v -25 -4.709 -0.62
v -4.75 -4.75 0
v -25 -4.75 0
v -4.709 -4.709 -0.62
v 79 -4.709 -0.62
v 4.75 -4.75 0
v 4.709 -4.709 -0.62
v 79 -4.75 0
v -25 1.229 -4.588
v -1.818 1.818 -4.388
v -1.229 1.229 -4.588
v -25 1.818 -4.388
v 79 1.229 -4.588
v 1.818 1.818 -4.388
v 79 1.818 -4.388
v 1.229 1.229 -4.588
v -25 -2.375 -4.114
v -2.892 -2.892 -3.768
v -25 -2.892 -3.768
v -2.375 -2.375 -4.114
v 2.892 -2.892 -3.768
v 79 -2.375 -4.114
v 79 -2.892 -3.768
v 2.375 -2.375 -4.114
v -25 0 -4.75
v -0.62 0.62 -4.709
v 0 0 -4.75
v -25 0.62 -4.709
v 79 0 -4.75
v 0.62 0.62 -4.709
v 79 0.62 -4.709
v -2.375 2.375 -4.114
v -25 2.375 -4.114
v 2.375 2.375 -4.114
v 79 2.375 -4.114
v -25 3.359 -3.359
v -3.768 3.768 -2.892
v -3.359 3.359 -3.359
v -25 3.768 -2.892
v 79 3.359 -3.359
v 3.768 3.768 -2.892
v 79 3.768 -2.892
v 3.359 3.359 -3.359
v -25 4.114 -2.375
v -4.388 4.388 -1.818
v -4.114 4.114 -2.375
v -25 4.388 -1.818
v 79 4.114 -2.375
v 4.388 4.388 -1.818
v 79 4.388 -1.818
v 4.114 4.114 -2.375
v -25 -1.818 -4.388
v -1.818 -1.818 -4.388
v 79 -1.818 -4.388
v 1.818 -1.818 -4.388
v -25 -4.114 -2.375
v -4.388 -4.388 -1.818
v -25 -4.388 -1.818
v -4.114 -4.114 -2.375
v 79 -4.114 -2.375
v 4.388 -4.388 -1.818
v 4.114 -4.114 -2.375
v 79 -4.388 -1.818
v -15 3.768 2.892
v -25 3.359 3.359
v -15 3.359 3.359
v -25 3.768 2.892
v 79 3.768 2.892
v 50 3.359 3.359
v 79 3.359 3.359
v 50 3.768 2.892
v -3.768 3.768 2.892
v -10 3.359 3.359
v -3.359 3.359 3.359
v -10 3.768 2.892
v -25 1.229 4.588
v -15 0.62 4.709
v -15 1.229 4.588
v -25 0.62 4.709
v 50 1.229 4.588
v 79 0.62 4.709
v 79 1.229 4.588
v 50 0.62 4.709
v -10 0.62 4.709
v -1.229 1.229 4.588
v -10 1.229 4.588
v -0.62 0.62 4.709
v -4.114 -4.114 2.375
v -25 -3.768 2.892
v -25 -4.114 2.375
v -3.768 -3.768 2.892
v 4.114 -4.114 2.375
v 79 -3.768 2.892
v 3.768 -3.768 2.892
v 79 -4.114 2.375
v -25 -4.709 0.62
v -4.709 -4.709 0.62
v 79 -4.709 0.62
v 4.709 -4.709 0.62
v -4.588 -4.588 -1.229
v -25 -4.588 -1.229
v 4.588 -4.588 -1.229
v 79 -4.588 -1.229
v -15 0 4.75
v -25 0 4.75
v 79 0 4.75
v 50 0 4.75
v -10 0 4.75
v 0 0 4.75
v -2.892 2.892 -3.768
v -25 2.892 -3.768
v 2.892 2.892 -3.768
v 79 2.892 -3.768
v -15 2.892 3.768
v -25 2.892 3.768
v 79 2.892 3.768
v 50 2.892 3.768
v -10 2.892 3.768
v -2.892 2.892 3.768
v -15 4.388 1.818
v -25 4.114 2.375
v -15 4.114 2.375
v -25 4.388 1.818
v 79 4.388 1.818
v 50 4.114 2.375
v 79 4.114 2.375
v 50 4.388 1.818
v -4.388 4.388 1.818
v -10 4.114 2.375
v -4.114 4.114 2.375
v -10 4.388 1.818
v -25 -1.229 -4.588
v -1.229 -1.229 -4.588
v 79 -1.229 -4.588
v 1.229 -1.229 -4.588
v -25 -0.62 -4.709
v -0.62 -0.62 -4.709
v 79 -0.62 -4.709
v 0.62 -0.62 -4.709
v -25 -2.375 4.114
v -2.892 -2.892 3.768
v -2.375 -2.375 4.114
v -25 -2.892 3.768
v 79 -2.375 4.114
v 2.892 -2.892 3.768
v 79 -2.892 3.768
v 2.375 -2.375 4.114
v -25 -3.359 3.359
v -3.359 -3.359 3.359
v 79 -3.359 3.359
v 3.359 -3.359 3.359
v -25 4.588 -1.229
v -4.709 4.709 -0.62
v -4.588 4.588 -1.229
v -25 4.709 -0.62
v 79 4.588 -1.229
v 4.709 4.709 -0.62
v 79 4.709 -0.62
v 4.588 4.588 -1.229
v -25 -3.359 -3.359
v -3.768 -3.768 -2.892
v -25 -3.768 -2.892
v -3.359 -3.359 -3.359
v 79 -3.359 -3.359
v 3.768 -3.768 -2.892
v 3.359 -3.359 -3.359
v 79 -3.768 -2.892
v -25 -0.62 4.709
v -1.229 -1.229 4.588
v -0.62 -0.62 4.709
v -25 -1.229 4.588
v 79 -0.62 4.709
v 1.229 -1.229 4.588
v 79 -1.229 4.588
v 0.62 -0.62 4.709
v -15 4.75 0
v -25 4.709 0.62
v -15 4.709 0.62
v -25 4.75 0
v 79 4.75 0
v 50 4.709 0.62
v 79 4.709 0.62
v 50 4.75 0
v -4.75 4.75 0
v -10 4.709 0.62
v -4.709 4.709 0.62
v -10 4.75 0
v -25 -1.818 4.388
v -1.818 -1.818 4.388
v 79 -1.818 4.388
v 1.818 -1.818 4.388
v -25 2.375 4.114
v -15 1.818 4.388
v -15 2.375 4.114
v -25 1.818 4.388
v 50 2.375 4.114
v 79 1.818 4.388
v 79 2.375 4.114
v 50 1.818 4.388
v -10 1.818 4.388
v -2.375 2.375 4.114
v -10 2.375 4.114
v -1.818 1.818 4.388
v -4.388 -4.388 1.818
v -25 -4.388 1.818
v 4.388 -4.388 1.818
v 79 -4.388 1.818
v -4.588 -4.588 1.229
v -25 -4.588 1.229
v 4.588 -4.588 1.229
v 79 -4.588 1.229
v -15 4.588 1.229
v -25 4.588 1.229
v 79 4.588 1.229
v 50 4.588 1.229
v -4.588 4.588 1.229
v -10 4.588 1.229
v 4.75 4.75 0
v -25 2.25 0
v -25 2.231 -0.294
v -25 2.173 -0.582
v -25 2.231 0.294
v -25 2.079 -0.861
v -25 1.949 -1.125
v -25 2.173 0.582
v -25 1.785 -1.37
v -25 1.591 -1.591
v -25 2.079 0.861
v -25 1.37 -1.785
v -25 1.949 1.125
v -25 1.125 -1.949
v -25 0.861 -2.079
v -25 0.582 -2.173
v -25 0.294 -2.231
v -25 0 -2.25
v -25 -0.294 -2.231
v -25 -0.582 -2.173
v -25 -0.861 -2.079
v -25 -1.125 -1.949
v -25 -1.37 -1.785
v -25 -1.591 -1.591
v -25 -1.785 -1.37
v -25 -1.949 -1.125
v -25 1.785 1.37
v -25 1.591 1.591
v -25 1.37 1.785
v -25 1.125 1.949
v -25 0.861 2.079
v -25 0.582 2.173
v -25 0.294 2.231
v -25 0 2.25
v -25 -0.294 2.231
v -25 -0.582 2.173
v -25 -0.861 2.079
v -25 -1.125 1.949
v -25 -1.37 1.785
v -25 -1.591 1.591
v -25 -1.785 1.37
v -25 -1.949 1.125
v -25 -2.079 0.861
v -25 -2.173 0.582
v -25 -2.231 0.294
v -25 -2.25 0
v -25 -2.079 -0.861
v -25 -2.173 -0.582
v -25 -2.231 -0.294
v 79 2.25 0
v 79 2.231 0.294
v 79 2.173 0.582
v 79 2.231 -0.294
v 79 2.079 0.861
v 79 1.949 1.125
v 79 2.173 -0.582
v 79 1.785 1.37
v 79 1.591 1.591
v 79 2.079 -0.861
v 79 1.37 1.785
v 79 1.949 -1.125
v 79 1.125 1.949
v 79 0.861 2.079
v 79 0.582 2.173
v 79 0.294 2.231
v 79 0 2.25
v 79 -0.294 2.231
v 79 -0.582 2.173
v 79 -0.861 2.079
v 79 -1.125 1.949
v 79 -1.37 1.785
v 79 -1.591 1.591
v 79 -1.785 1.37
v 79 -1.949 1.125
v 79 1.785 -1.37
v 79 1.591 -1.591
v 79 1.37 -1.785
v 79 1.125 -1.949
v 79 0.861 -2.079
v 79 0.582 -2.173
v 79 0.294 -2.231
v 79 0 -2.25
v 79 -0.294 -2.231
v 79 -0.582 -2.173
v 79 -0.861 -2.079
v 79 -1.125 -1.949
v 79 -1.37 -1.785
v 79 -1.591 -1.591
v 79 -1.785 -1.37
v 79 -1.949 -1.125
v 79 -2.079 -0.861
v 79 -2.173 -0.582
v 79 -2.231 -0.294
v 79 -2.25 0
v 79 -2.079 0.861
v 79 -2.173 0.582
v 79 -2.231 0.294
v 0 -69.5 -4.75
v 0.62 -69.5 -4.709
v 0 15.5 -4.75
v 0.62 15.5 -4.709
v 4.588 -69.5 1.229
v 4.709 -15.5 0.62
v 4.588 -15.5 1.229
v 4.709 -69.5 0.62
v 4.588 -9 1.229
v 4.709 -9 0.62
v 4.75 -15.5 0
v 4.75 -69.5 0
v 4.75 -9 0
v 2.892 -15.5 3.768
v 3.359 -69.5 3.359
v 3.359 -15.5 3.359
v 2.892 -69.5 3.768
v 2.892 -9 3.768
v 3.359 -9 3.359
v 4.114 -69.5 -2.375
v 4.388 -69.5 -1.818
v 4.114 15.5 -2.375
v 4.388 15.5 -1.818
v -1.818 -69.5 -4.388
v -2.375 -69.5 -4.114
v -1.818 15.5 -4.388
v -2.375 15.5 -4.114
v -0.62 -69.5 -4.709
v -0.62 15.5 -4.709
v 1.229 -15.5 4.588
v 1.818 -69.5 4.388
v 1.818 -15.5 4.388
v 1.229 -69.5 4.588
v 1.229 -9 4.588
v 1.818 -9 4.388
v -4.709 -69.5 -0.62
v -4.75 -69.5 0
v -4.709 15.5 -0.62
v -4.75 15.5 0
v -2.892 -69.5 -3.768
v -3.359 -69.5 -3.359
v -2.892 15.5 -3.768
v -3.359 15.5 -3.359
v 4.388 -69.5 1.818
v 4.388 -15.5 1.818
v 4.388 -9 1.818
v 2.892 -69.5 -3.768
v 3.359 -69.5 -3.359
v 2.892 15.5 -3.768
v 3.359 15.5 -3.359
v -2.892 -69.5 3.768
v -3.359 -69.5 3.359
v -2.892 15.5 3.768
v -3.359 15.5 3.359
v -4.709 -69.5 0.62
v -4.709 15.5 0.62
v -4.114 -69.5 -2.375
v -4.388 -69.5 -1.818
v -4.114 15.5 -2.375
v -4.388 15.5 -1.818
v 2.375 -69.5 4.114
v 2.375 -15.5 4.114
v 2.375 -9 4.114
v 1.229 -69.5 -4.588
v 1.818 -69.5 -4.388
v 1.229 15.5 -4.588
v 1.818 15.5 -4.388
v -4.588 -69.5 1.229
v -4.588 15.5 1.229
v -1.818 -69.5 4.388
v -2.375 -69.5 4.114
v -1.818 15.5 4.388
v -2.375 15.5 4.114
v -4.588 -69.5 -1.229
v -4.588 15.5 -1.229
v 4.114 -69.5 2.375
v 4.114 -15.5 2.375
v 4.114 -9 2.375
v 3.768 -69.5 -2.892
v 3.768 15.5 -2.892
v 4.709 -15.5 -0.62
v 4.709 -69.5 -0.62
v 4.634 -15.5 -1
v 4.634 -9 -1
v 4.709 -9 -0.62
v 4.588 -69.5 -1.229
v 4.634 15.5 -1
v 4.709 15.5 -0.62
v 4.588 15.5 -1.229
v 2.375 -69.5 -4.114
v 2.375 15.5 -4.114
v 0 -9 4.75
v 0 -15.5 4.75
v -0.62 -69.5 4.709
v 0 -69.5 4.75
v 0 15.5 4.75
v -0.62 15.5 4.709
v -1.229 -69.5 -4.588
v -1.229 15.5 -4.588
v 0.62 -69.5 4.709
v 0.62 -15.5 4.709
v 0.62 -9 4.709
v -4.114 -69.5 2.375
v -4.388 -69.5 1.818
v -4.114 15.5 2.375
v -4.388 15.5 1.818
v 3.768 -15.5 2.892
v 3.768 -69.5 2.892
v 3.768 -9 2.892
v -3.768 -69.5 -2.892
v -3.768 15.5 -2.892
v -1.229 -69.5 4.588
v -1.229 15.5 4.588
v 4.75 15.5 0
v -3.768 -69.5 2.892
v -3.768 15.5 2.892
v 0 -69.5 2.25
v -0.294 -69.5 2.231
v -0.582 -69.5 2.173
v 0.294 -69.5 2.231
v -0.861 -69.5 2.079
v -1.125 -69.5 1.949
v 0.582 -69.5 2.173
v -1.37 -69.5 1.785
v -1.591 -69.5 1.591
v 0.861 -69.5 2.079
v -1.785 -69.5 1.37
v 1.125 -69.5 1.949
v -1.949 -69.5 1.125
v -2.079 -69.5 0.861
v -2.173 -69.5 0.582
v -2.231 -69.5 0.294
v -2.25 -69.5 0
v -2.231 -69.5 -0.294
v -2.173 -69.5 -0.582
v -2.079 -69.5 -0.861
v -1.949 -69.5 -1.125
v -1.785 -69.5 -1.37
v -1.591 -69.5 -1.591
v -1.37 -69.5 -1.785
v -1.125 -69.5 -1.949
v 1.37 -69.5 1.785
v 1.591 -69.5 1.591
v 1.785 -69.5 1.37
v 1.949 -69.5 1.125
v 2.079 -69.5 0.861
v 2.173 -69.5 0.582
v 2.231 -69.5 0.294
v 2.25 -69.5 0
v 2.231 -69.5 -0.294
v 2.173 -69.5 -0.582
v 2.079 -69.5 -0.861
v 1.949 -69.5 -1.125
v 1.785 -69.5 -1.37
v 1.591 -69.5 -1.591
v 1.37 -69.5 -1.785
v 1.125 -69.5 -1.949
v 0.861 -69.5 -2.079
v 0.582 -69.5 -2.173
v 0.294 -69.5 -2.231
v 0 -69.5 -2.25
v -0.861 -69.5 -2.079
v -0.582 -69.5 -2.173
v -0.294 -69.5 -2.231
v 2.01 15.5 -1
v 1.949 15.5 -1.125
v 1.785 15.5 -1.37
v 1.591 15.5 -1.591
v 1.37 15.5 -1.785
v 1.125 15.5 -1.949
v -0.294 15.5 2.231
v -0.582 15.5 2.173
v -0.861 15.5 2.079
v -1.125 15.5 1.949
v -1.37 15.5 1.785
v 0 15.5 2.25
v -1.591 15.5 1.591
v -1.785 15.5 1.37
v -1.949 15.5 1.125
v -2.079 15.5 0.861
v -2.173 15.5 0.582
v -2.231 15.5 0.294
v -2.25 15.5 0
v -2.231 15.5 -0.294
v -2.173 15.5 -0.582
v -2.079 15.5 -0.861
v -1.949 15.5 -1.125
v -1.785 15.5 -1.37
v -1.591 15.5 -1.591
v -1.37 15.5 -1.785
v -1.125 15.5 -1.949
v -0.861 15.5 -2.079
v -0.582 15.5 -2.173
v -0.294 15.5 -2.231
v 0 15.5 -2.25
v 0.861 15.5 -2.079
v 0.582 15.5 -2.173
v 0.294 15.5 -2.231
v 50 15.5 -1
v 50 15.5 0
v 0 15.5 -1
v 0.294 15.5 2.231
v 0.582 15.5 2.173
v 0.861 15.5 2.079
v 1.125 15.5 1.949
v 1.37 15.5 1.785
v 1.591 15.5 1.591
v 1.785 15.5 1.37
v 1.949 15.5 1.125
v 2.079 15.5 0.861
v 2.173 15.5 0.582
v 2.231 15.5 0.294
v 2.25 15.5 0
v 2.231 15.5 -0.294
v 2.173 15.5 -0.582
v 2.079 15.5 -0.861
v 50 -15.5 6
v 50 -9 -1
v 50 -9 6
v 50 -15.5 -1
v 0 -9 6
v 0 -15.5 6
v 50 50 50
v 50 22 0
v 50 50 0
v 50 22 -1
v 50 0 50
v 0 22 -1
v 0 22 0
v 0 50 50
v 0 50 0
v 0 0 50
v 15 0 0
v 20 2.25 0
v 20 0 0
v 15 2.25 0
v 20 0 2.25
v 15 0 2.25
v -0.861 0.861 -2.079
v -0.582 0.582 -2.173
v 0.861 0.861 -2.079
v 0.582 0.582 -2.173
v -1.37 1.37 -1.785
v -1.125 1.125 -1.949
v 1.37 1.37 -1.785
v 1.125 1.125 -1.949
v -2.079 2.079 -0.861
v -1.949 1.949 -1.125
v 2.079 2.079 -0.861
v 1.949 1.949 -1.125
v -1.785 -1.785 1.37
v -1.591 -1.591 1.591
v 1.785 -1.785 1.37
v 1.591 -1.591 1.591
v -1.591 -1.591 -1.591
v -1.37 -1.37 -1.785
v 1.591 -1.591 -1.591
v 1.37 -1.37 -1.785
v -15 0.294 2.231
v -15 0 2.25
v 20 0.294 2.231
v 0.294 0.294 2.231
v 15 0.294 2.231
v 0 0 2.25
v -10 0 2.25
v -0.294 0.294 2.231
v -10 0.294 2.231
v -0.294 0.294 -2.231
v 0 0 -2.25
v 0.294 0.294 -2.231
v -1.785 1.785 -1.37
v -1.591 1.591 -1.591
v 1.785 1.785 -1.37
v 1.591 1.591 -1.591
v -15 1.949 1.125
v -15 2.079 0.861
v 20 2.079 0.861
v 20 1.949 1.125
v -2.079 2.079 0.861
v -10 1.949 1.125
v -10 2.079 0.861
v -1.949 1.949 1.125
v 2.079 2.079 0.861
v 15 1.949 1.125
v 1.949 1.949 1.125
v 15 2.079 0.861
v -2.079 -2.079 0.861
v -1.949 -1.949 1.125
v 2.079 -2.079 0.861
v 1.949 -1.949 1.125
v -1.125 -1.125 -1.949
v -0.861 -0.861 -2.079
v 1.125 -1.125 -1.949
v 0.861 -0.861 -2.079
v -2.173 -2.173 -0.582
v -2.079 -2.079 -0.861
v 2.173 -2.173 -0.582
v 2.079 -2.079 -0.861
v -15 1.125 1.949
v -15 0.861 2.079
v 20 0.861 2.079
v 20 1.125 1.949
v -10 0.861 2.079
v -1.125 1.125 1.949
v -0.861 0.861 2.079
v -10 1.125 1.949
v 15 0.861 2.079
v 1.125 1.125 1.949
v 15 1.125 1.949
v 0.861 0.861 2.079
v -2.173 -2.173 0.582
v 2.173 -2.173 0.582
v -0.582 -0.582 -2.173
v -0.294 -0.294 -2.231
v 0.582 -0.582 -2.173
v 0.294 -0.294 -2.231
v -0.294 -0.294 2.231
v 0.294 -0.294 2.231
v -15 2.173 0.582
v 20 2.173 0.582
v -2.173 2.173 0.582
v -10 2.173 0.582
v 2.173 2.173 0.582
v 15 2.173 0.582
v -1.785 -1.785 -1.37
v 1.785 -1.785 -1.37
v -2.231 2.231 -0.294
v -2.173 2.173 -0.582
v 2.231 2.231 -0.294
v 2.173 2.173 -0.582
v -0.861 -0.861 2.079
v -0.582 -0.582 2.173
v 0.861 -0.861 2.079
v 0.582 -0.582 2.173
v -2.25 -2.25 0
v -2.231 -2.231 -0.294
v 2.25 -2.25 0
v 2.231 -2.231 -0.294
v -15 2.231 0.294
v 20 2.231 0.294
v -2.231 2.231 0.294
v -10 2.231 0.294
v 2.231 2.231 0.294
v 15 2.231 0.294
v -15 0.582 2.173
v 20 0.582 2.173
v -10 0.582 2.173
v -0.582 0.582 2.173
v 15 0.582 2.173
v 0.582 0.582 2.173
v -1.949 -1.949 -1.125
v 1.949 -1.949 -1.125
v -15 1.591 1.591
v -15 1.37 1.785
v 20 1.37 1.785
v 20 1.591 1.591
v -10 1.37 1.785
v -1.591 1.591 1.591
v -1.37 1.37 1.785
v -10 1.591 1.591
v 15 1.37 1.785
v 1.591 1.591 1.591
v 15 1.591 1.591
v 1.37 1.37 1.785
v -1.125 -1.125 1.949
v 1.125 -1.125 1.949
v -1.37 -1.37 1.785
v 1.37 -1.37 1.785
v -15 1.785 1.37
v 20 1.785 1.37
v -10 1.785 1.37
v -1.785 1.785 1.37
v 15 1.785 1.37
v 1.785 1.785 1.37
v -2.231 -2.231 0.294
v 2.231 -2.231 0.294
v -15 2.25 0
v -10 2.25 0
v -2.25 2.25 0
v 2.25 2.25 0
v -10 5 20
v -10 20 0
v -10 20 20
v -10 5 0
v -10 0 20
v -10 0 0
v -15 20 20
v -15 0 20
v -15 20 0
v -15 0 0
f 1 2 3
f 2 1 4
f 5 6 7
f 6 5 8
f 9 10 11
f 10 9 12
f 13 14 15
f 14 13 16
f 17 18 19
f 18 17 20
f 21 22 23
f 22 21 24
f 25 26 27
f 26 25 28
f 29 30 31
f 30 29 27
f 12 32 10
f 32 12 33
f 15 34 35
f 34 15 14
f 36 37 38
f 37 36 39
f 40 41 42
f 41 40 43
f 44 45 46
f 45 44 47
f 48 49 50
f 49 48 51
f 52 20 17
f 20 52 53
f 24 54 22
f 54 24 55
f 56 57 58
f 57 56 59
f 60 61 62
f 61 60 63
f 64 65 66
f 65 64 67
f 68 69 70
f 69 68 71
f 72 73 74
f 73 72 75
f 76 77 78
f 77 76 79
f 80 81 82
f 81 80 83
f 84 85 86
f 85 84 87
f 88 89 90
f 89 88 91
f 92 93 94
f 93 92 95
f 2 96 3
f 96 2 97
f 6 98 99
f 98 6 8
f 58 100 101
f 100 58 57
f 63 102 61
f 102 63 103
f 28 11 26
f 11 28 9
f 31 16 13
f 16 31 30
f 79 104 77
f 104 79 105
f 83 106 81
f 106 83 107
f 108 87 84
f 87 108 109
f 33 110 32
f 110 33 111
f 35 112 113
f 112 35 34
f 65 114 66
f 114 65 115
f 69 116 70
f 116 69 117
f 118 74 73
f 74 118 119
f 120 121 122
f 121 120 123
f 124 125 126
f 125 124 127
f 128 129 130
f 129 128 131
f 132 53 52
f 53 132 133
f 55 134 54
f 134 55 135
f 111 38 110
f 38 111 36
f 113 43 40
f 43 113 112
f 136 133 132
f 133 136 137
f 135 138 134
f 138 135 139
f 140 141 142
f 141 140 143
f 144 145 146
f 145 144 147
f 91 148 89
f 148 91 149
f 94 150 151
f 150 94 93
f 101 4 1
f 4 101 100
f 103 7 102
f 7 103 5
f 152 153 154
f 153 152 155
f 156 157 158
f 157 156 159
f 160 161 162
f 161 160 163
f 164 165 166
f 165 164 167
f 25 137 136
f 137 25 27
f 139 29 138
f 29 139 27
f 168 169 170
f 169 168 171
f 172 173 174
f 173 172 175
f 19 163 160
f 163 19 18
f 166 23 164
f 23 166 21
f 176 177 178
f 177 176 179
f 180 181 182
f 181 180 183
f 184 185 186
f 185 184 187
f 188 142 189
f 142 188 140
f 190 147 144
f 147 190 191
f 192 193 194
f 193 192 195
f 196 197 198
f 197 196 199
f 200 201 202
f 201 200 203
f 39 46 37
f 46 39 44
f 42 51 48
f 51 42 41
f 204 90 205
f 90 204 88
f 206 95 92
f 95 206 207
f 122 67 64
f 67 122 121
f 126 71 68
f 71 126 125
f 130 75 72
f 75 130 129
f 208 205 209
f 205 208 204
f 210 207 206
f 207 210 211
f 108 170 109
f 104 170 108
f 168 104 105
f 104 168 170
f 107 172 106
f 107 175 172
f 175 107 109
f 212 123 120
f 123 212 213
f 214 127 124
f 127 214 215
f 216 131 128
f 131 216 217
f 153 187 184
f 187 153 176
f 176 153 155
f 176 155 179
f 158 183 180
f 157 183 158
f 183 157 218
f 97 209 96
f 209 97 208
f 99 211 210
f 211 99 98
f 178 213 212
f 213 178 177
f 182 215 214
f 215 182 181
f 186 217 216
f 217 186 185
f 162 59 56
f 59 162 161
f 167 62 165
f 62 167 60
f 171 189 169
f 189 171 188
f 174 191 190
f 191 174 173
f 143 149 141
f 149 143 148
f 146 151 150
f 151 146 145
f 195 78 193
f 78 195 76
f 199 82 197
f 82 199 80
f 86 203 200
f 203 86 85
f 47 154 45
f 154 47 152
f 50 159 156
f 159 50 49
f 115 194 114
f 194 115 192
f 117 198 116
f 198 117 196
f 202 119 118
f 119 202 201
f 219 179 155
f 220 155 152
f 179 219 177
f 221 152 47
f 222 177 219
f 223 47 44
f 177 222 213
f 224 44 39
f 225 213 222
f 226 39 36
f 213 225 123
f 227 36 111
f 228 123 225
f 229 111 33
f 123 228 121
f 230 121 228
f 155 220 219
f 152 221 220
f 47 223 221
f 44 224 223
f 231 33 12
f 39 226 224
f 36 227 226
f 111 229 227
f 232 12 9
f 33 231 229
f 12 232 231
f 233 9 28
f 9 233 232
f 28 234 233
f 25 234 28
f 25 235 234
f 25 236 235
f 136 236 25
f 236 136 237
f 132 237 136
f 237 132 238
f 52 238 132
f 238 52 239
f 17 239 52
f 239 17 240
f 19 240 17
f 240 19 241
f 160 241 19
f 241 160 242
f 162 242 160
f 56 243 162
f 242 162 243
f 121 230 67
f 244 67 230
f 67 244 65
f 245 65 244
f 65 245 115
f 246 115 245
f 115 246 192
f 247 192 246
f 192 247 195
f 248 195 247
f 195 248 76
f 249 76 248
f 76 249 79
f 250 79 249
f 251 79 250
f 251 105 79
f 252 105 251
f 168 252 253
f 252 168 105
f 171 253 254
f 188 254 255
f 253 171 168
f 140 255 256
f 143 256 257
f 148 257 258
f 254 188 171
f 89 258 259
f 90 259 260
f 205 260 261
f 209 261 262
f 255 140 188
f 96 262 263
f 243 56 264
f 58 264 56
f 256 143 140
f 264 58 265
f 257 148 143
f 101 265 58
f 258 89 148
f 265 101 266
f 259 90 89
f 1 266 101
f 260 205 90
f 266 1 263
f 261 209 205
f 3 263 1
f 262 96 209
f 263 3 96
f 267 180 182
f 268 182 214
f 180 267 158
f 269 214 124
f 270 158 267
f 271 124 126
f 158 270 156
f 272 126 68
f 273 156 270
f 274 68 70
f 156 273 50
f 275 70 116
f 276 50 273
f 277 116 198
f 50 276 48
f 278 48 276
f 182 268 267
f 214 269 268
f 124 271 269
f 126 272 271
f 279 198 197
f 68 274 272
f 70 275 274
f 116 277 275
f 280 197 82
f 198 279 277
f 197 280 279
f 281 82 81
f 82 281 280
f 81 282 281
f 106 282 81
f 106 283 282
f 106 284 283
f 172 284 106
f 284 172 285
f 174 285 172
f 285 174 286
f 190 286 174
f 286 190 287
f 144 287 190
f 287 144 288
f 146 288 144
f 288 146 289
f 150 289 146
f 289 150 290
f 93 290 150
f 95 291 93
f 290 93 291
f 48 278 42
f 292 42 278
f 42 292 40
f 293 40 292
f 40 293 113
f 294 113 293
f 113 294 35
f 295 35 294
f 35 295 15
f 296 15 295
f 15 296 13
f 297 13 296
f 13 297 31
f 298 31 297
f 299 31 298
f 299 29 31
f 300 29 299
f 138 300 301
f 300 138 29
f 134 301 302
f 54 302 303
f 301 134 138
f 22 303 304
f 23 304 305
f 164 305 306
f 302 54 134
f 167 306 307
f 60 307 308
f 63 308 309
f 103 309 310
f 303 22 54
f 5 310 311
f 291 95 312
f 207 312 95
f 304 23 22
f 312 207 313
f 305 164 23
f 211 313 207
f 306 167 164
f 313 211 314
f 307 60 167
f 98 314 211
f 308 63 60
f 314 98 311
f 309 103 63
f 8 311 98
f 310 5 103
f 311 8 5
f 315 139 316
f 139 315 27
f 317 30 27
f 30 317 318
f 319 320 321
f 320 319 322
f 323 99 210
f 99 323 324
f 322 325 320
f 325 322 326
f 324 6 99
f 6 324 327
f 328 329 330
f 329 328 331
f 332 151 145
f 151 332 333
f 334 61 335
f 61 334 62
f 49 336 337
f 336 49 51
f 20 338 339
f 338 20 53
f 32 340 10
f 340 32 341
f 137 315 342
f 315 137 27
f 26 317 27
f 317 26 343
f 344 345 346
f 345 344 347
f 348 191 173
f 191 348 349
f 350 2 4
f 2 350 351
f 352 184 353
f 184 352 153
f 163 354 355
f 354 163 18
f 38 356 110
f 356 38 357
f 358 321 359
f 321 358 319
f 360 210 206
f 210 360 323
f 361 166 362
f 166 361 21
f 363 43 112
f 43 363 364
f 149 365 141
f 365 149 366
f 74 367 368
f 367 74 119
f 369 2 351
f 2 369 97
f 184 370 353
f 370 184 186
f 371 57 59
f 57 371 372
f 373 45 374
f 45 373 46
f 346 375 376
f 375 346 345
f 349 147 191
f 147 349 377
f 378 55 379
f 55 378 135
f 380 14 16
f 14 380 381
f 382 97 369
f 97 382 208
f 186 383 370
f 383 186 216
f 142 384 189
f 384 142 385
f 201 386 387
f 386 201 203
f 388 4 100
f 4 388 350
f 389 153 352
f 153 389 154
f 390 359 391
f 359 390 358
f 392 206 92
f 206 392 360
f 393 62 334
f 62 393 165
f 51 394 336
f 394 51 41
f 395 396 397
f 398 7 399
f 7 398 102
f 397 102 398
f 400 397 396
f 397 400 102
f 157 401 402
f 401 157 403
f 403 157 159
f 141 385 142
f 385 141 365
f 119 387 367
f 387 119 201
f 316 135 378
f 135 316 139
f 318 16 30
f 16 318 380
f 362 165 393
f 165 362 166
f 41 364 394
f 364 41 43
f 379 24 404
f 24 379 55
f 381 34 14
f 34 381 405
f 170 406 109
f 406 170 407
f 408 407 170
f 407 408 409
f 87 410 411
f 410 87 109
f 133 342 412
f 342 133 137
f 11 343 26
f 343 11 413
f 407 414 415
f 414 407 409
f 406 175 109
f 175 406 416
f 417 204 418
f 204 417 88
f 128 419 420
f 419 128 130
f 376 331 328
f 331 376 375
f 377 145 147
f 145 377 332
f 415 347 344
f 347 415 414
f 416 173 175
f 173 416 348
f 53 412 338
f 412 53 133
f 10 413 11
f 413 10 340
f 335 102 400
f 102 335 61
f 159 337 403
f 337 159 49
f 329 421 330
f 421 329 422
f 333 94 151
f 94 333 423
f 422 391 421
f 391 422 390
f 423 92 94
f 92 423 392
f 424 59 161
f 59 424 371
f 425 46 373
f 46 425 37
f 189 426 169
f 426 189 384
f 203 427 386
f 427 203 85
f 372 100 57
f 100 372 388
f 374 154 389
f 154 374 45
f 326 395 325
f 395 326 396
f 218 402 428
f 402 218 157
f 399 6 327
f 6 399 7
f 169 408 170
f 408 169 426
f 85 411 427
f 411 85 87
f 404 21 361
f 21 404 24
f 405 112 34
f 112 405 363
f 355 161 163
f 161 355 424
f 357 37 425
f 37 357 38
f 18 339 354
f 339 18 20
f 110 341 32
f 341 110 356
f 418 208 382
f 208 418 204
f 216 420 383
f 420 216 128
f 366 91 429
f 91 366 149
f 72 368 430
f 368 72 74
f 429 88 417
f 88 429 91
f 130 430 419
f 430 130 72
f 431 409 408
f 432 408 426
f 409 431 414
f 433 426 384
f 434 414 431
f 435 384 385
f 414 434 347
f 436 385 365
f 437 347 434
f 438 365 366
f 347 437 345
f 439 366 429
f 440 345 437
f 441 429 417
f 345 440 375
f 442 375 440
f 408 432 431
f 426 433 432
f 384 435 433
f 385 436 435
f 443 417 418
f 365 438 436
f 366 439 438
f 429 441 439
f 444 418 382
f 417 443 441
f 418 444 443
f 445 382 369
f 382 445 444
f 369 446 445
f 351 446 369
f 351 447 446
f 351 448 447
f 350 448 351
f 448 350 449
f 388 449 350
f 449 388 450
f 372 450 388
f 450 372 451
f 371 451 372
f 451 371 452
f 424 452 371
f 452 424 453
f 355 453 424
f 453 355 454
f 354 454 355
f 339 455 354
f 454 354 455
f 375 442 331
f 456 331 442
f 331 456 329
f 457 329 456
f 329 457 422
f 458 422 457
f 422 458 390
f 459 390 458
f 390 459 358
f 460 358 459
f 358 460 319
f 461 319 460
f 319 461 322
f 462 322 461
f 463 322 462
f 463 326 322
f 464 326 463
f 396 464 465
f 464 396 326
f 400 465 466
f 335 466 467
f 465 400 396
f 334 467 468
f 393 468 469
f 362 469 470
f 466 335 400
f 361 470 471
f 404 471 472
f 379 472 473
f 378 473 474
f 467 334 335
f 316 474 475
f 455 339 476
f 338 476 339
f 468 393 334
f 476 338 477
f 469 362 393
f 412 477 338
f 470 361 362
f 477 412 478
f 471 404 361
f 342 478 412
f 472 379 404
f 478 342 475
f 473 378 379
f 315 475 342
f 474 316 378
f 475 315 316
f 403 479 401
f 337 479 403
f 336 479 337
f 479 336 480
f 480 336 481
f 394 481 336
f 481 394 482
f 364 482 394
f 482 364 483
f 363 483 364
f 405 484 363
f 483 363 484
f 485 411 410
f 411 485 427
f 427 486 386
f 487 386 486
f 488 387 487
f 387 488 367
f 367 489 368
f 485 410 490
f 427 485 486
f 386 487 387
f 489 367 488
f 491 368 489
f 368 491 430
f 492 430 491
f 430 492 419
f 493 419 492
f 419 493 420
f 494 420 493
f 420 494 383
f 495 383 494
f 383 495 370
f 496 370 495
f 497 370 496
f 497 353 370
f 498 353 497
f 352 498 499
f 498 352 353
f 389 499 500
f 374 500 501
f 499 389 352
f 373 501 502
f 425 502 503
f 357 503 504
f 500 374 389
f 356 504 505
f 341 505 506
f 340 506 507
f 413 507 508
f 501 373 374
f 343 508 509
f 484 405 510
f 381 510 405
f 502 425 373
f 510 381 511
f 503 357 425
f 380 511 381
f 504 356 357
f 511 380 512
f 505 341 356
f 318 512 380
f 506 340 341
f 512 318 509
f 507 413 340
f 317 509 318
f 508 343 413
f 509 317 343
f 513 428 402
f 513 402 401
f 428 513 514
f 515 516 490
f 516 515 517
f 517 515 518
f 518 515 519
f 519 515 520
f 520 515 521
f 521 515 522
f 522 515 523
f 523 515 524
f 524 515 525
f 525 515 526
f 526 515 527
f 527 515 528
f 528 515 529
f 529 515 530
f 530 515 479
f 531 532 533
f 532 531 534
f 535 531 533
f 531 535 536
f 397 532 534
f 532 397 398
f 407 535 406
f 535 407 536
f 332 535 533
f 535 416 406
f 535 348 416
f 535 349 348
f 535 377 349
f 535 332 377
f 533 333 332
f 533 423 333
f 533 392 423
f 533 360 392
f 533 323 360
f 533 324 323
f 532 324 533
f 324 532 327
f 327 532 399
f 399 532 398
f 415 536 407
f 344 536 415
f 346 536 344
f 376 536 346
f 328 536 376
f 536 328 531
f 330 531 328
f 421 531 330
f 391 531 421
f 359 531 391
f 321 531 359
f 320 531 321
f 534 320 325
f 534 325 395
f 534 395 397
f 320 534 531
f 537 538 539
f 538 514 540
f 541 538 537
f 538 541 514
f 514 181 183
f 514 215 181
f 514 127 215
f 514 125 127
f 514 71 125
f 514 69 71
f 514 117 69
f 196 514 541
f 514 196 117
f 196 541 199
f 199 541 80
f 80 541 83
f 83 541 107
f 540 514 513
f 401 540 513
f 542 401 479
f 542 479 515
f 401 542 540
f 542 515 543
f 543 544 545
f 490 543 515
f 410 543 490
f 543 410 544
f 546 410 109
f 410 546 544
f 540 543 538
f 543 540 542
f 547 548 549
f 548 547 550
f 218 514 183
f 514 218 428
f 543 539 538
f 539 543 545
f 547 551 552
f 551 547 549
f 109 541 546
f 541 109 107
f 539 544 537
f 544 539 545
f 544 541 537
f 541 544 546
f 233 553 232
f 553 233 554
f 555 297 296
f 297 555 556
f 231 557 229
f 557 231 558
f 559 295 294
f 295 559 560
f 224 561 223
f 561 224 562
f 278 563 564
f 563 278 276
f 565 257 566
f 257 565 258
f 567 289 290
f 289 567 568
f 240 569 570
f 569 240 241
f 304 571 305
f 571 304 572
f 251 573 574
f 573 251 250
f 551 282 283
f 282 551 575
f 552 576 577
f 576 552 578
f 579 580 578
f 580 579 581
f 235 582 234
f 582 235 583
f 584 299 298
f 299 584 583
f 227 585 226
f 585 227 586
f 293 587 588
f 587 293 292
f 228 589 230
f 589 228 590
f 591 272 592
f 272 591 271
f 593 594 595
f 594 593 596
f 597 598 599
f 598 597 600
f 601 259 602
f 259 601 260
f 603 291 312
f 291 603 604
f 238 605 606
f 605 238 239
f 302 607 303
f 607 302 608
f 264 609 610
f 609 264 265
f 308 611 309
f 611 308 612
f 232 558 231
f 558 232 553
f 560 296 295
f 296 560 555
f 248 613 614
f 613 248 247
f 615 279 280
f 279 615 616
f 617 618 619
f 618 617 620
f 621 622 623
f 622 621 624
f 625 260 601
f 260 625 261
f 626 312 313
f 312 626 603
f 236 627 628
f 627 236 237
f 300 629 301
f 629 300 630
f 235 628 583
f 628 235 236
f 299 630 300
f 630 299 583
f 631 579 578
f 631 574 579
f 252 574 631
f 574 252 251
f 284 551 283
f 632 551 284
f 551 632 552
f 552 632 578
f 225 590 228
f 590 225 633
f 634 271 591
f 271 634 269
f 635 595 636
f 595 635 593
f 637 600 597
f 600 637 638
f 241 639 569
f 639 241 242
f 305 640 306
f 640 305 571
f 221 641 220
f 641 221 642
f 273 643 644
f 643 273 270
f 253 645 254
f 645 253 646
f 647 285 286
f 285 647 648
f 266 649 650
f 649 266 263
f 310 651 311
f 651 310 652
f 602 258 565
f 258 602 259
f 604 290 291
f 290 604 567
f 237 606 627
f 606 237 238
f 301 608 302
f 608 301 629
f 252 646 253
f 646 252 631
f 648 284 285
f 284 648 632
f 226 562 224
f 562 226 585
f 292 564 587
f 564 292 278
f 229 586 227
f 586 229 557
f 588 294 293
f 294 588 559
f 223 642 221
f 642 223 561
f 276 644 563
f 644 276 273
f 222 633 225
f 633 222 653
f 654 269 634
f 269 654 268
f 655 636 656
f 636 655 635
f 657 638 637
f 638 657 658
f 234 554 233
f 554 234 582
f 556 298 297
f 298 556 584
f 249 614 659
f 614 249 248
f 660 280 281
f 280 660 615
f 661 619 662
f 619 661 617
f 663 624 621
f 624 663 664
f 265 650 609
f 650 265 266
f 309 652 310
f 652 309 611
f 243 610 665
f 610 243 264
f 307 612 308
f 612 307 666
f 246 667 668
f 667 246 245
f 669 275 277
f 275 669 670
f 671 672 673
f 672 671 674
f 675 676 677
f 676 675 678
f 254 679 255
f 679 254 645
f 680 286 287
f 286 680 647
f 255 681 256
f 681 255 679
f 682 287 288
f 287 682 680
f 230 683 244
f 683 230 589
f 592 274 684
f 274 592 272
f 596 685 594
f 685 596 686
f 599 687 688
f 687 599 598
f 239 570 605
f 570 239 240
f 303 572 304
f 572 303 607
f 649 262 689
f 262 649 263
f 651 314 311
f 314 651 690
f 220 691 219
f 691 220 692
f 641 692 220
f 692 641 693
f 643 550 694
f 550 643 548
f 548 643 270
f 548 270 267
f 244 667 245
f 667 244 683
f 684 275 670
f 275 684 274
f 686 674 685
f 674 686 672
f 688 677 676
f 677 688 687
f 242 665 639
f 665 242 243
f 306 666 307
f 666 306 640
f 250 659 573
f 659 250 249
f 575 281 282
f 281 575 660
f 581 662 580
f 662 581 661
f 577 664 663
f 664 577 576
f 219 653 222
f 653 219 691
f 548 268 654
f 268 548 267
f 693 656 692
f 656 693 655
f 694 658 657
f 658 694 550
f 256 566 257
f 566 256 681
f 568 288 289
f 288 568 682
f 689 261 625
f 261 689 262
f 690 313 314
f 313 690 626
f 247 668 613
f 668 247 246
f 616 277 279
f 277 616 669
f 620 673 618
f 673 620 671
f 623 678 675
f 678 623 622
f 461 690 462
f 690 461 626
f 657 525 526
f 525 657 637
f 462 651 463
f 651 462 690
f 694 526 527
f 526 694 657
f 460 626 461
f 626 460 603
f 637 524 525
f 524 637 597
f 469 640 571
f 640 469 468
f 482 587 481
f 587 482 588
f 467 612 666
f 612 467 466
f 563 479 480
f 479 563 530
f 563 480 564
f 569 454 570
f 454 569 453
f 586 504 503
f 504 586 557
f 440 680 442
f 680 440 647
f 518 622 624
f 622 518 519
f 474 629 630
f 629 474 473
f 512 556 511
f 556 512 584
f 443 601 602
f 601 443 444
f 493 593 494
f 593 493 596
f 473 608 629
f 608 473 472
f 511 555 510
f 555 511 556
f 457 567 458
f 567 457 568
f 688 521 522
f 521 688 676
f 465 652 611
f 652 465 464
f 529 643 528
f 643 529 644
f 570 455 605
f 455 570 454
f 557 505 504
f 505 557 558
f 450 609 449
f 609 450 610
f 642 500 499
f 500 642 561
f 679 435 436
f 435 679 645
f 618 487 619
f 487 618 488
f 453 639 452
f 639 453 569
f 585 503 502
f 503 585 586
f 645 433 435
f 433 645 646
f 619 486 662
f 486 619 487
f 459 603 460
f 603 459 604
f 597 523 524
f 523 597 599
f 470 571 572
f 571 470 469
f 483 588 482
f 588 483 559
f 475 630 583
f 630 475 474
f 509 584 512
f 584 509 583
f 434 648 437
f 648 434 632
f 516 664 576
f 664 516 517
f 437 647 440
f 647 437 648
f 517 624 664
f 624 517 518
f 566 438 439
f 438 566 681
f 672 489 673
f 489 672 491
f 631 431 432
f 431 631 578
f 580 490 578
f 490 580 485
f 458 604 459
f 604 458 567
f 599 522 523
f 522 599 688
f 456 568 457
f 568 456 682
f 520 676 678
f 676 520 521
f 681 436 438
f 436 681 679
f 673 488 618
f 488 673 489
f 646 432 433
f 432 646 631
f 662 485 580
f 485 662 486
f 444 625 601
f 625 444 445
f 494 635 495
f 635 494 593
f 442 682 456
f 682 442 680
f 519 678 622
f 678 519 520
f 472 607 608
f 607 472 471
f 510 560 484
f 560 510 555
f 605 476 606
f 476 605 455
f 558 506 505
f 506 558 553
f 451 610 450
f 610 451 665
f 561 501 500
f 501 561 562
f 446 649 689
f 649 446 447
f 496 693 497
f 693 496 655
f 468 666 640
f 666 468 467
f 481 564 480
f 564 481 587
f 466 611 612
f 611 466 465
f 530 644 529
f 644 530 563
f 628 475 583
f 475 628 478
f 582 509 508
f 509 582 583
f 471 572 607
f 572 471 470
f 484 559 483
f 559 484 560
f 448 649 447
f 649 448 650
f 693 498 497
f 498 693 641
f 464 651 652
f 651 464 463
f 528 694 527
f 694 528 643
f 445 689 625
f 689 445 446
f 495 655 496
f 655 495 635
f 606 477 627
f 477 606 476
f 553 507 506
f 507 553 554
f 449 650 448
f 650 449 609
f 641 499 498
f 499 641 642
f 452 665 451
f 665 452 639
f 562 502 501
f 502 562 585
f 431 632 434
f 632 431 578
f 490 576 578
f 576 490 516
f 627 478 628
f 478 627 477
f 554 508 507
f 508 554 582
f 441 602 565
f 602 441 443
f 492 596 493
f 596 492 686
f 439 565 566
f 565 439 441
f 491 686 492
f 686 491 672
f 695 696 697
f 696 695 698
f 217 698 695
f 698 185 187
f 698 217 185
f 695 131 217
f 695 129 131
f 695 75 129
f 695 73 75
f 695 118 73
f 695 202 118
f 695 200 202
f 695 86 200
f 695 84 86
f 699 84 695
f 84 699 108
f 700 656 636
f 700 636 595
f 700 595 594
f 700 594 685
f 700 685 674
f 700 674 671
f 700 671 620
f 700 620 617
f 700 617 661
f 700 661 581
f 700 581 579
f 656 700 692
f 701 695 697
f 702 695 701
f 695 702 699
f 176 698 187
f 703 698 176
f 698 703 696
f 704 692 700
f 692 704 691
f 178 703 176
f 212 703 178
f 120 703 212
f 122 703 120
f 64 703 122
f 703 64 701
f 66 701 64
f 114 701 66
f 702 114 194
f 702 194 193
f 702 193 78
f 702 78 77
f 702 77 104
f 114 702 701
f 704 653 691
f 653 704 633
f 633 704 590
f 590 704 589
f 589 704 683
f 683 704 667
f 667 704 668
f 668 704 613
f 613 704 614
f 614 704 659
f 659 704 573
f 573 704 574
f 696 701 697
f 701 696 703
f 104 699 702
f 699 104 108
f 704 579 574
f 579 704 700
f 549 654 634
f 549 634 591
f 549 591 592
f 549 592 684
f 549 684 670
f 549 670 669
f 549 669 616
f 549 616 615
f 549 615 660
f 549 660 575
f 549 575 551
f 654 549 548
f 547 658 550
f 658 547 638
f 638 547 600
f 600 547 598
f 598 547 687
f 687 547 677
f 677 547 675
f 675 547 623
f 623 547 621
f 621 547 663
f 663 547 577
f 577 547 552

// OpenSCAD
// L-shaped mounting bracket for a NEMA 17 stepper motor (syringe pump, bench top). NOVEL general part.
//

base_d  = 50;
base_t  = 5;
arm_l   = 50;
arm_t   = 5;
motor_h = 50;
screw  = 4.5;

$fn = 48;

gusset_t = 5;
tunnel   = screw + 5;

difference() {
    union() {
        cube([base_d, base_t, base_t]);                                              // base plate (square, for stability)
        cube([base_d, arm_l, arm_t]);                                                 // motor arm
        cube([base_d, arm_l, motor_h]);                                               // standing motor plate
        for (x = [-base_d / 2, base_d / 2])
            translate([x, 0, 0]) rotate([0, 90, 0]) cylinder(h = arm_l + 4, d = tunnel);   // motor mount holes (along Y)
        for (x = [-15.5, 15.5])
            translate([0, x, 0]) rotate([90, 0, 0]) cylinder(h = arm_l + 4, d = tunnel);   // motor mount holes (along X)
        for (s = [-15.5, 15.5])
            translate([0, s, -1]) cube([base_d, screw + 2, base_t + 2]);              // screw holes in the arm
    }
    for (x = [-base_d / 2, base_d / 2])
        translate([x, 0, 0]) rotate([0, 90, 0]) cylinder(h = arm_l + 4, d = screw);   // motor mount holes (along Y)
    for (x = [-15.5, 15.5])
        translate([0, x, 0]) rotate([90, 0, 0]) cylinder(h = arm_l + 4, d = screw);   // motor mount holes (along X)
}

for (dir = [-1, 1]) {
    translate([dir * (base_d / 2 - 10), 0, 0])
        difference() {
            cube([base_t, 20, 20]);                                              // gusset (right triangle in the YZ plane)
            translate([base_t, 0, -1]) cube([base_t, 5, 21]);                    // pocket the gusset into the arm so it bonds
        }
}
